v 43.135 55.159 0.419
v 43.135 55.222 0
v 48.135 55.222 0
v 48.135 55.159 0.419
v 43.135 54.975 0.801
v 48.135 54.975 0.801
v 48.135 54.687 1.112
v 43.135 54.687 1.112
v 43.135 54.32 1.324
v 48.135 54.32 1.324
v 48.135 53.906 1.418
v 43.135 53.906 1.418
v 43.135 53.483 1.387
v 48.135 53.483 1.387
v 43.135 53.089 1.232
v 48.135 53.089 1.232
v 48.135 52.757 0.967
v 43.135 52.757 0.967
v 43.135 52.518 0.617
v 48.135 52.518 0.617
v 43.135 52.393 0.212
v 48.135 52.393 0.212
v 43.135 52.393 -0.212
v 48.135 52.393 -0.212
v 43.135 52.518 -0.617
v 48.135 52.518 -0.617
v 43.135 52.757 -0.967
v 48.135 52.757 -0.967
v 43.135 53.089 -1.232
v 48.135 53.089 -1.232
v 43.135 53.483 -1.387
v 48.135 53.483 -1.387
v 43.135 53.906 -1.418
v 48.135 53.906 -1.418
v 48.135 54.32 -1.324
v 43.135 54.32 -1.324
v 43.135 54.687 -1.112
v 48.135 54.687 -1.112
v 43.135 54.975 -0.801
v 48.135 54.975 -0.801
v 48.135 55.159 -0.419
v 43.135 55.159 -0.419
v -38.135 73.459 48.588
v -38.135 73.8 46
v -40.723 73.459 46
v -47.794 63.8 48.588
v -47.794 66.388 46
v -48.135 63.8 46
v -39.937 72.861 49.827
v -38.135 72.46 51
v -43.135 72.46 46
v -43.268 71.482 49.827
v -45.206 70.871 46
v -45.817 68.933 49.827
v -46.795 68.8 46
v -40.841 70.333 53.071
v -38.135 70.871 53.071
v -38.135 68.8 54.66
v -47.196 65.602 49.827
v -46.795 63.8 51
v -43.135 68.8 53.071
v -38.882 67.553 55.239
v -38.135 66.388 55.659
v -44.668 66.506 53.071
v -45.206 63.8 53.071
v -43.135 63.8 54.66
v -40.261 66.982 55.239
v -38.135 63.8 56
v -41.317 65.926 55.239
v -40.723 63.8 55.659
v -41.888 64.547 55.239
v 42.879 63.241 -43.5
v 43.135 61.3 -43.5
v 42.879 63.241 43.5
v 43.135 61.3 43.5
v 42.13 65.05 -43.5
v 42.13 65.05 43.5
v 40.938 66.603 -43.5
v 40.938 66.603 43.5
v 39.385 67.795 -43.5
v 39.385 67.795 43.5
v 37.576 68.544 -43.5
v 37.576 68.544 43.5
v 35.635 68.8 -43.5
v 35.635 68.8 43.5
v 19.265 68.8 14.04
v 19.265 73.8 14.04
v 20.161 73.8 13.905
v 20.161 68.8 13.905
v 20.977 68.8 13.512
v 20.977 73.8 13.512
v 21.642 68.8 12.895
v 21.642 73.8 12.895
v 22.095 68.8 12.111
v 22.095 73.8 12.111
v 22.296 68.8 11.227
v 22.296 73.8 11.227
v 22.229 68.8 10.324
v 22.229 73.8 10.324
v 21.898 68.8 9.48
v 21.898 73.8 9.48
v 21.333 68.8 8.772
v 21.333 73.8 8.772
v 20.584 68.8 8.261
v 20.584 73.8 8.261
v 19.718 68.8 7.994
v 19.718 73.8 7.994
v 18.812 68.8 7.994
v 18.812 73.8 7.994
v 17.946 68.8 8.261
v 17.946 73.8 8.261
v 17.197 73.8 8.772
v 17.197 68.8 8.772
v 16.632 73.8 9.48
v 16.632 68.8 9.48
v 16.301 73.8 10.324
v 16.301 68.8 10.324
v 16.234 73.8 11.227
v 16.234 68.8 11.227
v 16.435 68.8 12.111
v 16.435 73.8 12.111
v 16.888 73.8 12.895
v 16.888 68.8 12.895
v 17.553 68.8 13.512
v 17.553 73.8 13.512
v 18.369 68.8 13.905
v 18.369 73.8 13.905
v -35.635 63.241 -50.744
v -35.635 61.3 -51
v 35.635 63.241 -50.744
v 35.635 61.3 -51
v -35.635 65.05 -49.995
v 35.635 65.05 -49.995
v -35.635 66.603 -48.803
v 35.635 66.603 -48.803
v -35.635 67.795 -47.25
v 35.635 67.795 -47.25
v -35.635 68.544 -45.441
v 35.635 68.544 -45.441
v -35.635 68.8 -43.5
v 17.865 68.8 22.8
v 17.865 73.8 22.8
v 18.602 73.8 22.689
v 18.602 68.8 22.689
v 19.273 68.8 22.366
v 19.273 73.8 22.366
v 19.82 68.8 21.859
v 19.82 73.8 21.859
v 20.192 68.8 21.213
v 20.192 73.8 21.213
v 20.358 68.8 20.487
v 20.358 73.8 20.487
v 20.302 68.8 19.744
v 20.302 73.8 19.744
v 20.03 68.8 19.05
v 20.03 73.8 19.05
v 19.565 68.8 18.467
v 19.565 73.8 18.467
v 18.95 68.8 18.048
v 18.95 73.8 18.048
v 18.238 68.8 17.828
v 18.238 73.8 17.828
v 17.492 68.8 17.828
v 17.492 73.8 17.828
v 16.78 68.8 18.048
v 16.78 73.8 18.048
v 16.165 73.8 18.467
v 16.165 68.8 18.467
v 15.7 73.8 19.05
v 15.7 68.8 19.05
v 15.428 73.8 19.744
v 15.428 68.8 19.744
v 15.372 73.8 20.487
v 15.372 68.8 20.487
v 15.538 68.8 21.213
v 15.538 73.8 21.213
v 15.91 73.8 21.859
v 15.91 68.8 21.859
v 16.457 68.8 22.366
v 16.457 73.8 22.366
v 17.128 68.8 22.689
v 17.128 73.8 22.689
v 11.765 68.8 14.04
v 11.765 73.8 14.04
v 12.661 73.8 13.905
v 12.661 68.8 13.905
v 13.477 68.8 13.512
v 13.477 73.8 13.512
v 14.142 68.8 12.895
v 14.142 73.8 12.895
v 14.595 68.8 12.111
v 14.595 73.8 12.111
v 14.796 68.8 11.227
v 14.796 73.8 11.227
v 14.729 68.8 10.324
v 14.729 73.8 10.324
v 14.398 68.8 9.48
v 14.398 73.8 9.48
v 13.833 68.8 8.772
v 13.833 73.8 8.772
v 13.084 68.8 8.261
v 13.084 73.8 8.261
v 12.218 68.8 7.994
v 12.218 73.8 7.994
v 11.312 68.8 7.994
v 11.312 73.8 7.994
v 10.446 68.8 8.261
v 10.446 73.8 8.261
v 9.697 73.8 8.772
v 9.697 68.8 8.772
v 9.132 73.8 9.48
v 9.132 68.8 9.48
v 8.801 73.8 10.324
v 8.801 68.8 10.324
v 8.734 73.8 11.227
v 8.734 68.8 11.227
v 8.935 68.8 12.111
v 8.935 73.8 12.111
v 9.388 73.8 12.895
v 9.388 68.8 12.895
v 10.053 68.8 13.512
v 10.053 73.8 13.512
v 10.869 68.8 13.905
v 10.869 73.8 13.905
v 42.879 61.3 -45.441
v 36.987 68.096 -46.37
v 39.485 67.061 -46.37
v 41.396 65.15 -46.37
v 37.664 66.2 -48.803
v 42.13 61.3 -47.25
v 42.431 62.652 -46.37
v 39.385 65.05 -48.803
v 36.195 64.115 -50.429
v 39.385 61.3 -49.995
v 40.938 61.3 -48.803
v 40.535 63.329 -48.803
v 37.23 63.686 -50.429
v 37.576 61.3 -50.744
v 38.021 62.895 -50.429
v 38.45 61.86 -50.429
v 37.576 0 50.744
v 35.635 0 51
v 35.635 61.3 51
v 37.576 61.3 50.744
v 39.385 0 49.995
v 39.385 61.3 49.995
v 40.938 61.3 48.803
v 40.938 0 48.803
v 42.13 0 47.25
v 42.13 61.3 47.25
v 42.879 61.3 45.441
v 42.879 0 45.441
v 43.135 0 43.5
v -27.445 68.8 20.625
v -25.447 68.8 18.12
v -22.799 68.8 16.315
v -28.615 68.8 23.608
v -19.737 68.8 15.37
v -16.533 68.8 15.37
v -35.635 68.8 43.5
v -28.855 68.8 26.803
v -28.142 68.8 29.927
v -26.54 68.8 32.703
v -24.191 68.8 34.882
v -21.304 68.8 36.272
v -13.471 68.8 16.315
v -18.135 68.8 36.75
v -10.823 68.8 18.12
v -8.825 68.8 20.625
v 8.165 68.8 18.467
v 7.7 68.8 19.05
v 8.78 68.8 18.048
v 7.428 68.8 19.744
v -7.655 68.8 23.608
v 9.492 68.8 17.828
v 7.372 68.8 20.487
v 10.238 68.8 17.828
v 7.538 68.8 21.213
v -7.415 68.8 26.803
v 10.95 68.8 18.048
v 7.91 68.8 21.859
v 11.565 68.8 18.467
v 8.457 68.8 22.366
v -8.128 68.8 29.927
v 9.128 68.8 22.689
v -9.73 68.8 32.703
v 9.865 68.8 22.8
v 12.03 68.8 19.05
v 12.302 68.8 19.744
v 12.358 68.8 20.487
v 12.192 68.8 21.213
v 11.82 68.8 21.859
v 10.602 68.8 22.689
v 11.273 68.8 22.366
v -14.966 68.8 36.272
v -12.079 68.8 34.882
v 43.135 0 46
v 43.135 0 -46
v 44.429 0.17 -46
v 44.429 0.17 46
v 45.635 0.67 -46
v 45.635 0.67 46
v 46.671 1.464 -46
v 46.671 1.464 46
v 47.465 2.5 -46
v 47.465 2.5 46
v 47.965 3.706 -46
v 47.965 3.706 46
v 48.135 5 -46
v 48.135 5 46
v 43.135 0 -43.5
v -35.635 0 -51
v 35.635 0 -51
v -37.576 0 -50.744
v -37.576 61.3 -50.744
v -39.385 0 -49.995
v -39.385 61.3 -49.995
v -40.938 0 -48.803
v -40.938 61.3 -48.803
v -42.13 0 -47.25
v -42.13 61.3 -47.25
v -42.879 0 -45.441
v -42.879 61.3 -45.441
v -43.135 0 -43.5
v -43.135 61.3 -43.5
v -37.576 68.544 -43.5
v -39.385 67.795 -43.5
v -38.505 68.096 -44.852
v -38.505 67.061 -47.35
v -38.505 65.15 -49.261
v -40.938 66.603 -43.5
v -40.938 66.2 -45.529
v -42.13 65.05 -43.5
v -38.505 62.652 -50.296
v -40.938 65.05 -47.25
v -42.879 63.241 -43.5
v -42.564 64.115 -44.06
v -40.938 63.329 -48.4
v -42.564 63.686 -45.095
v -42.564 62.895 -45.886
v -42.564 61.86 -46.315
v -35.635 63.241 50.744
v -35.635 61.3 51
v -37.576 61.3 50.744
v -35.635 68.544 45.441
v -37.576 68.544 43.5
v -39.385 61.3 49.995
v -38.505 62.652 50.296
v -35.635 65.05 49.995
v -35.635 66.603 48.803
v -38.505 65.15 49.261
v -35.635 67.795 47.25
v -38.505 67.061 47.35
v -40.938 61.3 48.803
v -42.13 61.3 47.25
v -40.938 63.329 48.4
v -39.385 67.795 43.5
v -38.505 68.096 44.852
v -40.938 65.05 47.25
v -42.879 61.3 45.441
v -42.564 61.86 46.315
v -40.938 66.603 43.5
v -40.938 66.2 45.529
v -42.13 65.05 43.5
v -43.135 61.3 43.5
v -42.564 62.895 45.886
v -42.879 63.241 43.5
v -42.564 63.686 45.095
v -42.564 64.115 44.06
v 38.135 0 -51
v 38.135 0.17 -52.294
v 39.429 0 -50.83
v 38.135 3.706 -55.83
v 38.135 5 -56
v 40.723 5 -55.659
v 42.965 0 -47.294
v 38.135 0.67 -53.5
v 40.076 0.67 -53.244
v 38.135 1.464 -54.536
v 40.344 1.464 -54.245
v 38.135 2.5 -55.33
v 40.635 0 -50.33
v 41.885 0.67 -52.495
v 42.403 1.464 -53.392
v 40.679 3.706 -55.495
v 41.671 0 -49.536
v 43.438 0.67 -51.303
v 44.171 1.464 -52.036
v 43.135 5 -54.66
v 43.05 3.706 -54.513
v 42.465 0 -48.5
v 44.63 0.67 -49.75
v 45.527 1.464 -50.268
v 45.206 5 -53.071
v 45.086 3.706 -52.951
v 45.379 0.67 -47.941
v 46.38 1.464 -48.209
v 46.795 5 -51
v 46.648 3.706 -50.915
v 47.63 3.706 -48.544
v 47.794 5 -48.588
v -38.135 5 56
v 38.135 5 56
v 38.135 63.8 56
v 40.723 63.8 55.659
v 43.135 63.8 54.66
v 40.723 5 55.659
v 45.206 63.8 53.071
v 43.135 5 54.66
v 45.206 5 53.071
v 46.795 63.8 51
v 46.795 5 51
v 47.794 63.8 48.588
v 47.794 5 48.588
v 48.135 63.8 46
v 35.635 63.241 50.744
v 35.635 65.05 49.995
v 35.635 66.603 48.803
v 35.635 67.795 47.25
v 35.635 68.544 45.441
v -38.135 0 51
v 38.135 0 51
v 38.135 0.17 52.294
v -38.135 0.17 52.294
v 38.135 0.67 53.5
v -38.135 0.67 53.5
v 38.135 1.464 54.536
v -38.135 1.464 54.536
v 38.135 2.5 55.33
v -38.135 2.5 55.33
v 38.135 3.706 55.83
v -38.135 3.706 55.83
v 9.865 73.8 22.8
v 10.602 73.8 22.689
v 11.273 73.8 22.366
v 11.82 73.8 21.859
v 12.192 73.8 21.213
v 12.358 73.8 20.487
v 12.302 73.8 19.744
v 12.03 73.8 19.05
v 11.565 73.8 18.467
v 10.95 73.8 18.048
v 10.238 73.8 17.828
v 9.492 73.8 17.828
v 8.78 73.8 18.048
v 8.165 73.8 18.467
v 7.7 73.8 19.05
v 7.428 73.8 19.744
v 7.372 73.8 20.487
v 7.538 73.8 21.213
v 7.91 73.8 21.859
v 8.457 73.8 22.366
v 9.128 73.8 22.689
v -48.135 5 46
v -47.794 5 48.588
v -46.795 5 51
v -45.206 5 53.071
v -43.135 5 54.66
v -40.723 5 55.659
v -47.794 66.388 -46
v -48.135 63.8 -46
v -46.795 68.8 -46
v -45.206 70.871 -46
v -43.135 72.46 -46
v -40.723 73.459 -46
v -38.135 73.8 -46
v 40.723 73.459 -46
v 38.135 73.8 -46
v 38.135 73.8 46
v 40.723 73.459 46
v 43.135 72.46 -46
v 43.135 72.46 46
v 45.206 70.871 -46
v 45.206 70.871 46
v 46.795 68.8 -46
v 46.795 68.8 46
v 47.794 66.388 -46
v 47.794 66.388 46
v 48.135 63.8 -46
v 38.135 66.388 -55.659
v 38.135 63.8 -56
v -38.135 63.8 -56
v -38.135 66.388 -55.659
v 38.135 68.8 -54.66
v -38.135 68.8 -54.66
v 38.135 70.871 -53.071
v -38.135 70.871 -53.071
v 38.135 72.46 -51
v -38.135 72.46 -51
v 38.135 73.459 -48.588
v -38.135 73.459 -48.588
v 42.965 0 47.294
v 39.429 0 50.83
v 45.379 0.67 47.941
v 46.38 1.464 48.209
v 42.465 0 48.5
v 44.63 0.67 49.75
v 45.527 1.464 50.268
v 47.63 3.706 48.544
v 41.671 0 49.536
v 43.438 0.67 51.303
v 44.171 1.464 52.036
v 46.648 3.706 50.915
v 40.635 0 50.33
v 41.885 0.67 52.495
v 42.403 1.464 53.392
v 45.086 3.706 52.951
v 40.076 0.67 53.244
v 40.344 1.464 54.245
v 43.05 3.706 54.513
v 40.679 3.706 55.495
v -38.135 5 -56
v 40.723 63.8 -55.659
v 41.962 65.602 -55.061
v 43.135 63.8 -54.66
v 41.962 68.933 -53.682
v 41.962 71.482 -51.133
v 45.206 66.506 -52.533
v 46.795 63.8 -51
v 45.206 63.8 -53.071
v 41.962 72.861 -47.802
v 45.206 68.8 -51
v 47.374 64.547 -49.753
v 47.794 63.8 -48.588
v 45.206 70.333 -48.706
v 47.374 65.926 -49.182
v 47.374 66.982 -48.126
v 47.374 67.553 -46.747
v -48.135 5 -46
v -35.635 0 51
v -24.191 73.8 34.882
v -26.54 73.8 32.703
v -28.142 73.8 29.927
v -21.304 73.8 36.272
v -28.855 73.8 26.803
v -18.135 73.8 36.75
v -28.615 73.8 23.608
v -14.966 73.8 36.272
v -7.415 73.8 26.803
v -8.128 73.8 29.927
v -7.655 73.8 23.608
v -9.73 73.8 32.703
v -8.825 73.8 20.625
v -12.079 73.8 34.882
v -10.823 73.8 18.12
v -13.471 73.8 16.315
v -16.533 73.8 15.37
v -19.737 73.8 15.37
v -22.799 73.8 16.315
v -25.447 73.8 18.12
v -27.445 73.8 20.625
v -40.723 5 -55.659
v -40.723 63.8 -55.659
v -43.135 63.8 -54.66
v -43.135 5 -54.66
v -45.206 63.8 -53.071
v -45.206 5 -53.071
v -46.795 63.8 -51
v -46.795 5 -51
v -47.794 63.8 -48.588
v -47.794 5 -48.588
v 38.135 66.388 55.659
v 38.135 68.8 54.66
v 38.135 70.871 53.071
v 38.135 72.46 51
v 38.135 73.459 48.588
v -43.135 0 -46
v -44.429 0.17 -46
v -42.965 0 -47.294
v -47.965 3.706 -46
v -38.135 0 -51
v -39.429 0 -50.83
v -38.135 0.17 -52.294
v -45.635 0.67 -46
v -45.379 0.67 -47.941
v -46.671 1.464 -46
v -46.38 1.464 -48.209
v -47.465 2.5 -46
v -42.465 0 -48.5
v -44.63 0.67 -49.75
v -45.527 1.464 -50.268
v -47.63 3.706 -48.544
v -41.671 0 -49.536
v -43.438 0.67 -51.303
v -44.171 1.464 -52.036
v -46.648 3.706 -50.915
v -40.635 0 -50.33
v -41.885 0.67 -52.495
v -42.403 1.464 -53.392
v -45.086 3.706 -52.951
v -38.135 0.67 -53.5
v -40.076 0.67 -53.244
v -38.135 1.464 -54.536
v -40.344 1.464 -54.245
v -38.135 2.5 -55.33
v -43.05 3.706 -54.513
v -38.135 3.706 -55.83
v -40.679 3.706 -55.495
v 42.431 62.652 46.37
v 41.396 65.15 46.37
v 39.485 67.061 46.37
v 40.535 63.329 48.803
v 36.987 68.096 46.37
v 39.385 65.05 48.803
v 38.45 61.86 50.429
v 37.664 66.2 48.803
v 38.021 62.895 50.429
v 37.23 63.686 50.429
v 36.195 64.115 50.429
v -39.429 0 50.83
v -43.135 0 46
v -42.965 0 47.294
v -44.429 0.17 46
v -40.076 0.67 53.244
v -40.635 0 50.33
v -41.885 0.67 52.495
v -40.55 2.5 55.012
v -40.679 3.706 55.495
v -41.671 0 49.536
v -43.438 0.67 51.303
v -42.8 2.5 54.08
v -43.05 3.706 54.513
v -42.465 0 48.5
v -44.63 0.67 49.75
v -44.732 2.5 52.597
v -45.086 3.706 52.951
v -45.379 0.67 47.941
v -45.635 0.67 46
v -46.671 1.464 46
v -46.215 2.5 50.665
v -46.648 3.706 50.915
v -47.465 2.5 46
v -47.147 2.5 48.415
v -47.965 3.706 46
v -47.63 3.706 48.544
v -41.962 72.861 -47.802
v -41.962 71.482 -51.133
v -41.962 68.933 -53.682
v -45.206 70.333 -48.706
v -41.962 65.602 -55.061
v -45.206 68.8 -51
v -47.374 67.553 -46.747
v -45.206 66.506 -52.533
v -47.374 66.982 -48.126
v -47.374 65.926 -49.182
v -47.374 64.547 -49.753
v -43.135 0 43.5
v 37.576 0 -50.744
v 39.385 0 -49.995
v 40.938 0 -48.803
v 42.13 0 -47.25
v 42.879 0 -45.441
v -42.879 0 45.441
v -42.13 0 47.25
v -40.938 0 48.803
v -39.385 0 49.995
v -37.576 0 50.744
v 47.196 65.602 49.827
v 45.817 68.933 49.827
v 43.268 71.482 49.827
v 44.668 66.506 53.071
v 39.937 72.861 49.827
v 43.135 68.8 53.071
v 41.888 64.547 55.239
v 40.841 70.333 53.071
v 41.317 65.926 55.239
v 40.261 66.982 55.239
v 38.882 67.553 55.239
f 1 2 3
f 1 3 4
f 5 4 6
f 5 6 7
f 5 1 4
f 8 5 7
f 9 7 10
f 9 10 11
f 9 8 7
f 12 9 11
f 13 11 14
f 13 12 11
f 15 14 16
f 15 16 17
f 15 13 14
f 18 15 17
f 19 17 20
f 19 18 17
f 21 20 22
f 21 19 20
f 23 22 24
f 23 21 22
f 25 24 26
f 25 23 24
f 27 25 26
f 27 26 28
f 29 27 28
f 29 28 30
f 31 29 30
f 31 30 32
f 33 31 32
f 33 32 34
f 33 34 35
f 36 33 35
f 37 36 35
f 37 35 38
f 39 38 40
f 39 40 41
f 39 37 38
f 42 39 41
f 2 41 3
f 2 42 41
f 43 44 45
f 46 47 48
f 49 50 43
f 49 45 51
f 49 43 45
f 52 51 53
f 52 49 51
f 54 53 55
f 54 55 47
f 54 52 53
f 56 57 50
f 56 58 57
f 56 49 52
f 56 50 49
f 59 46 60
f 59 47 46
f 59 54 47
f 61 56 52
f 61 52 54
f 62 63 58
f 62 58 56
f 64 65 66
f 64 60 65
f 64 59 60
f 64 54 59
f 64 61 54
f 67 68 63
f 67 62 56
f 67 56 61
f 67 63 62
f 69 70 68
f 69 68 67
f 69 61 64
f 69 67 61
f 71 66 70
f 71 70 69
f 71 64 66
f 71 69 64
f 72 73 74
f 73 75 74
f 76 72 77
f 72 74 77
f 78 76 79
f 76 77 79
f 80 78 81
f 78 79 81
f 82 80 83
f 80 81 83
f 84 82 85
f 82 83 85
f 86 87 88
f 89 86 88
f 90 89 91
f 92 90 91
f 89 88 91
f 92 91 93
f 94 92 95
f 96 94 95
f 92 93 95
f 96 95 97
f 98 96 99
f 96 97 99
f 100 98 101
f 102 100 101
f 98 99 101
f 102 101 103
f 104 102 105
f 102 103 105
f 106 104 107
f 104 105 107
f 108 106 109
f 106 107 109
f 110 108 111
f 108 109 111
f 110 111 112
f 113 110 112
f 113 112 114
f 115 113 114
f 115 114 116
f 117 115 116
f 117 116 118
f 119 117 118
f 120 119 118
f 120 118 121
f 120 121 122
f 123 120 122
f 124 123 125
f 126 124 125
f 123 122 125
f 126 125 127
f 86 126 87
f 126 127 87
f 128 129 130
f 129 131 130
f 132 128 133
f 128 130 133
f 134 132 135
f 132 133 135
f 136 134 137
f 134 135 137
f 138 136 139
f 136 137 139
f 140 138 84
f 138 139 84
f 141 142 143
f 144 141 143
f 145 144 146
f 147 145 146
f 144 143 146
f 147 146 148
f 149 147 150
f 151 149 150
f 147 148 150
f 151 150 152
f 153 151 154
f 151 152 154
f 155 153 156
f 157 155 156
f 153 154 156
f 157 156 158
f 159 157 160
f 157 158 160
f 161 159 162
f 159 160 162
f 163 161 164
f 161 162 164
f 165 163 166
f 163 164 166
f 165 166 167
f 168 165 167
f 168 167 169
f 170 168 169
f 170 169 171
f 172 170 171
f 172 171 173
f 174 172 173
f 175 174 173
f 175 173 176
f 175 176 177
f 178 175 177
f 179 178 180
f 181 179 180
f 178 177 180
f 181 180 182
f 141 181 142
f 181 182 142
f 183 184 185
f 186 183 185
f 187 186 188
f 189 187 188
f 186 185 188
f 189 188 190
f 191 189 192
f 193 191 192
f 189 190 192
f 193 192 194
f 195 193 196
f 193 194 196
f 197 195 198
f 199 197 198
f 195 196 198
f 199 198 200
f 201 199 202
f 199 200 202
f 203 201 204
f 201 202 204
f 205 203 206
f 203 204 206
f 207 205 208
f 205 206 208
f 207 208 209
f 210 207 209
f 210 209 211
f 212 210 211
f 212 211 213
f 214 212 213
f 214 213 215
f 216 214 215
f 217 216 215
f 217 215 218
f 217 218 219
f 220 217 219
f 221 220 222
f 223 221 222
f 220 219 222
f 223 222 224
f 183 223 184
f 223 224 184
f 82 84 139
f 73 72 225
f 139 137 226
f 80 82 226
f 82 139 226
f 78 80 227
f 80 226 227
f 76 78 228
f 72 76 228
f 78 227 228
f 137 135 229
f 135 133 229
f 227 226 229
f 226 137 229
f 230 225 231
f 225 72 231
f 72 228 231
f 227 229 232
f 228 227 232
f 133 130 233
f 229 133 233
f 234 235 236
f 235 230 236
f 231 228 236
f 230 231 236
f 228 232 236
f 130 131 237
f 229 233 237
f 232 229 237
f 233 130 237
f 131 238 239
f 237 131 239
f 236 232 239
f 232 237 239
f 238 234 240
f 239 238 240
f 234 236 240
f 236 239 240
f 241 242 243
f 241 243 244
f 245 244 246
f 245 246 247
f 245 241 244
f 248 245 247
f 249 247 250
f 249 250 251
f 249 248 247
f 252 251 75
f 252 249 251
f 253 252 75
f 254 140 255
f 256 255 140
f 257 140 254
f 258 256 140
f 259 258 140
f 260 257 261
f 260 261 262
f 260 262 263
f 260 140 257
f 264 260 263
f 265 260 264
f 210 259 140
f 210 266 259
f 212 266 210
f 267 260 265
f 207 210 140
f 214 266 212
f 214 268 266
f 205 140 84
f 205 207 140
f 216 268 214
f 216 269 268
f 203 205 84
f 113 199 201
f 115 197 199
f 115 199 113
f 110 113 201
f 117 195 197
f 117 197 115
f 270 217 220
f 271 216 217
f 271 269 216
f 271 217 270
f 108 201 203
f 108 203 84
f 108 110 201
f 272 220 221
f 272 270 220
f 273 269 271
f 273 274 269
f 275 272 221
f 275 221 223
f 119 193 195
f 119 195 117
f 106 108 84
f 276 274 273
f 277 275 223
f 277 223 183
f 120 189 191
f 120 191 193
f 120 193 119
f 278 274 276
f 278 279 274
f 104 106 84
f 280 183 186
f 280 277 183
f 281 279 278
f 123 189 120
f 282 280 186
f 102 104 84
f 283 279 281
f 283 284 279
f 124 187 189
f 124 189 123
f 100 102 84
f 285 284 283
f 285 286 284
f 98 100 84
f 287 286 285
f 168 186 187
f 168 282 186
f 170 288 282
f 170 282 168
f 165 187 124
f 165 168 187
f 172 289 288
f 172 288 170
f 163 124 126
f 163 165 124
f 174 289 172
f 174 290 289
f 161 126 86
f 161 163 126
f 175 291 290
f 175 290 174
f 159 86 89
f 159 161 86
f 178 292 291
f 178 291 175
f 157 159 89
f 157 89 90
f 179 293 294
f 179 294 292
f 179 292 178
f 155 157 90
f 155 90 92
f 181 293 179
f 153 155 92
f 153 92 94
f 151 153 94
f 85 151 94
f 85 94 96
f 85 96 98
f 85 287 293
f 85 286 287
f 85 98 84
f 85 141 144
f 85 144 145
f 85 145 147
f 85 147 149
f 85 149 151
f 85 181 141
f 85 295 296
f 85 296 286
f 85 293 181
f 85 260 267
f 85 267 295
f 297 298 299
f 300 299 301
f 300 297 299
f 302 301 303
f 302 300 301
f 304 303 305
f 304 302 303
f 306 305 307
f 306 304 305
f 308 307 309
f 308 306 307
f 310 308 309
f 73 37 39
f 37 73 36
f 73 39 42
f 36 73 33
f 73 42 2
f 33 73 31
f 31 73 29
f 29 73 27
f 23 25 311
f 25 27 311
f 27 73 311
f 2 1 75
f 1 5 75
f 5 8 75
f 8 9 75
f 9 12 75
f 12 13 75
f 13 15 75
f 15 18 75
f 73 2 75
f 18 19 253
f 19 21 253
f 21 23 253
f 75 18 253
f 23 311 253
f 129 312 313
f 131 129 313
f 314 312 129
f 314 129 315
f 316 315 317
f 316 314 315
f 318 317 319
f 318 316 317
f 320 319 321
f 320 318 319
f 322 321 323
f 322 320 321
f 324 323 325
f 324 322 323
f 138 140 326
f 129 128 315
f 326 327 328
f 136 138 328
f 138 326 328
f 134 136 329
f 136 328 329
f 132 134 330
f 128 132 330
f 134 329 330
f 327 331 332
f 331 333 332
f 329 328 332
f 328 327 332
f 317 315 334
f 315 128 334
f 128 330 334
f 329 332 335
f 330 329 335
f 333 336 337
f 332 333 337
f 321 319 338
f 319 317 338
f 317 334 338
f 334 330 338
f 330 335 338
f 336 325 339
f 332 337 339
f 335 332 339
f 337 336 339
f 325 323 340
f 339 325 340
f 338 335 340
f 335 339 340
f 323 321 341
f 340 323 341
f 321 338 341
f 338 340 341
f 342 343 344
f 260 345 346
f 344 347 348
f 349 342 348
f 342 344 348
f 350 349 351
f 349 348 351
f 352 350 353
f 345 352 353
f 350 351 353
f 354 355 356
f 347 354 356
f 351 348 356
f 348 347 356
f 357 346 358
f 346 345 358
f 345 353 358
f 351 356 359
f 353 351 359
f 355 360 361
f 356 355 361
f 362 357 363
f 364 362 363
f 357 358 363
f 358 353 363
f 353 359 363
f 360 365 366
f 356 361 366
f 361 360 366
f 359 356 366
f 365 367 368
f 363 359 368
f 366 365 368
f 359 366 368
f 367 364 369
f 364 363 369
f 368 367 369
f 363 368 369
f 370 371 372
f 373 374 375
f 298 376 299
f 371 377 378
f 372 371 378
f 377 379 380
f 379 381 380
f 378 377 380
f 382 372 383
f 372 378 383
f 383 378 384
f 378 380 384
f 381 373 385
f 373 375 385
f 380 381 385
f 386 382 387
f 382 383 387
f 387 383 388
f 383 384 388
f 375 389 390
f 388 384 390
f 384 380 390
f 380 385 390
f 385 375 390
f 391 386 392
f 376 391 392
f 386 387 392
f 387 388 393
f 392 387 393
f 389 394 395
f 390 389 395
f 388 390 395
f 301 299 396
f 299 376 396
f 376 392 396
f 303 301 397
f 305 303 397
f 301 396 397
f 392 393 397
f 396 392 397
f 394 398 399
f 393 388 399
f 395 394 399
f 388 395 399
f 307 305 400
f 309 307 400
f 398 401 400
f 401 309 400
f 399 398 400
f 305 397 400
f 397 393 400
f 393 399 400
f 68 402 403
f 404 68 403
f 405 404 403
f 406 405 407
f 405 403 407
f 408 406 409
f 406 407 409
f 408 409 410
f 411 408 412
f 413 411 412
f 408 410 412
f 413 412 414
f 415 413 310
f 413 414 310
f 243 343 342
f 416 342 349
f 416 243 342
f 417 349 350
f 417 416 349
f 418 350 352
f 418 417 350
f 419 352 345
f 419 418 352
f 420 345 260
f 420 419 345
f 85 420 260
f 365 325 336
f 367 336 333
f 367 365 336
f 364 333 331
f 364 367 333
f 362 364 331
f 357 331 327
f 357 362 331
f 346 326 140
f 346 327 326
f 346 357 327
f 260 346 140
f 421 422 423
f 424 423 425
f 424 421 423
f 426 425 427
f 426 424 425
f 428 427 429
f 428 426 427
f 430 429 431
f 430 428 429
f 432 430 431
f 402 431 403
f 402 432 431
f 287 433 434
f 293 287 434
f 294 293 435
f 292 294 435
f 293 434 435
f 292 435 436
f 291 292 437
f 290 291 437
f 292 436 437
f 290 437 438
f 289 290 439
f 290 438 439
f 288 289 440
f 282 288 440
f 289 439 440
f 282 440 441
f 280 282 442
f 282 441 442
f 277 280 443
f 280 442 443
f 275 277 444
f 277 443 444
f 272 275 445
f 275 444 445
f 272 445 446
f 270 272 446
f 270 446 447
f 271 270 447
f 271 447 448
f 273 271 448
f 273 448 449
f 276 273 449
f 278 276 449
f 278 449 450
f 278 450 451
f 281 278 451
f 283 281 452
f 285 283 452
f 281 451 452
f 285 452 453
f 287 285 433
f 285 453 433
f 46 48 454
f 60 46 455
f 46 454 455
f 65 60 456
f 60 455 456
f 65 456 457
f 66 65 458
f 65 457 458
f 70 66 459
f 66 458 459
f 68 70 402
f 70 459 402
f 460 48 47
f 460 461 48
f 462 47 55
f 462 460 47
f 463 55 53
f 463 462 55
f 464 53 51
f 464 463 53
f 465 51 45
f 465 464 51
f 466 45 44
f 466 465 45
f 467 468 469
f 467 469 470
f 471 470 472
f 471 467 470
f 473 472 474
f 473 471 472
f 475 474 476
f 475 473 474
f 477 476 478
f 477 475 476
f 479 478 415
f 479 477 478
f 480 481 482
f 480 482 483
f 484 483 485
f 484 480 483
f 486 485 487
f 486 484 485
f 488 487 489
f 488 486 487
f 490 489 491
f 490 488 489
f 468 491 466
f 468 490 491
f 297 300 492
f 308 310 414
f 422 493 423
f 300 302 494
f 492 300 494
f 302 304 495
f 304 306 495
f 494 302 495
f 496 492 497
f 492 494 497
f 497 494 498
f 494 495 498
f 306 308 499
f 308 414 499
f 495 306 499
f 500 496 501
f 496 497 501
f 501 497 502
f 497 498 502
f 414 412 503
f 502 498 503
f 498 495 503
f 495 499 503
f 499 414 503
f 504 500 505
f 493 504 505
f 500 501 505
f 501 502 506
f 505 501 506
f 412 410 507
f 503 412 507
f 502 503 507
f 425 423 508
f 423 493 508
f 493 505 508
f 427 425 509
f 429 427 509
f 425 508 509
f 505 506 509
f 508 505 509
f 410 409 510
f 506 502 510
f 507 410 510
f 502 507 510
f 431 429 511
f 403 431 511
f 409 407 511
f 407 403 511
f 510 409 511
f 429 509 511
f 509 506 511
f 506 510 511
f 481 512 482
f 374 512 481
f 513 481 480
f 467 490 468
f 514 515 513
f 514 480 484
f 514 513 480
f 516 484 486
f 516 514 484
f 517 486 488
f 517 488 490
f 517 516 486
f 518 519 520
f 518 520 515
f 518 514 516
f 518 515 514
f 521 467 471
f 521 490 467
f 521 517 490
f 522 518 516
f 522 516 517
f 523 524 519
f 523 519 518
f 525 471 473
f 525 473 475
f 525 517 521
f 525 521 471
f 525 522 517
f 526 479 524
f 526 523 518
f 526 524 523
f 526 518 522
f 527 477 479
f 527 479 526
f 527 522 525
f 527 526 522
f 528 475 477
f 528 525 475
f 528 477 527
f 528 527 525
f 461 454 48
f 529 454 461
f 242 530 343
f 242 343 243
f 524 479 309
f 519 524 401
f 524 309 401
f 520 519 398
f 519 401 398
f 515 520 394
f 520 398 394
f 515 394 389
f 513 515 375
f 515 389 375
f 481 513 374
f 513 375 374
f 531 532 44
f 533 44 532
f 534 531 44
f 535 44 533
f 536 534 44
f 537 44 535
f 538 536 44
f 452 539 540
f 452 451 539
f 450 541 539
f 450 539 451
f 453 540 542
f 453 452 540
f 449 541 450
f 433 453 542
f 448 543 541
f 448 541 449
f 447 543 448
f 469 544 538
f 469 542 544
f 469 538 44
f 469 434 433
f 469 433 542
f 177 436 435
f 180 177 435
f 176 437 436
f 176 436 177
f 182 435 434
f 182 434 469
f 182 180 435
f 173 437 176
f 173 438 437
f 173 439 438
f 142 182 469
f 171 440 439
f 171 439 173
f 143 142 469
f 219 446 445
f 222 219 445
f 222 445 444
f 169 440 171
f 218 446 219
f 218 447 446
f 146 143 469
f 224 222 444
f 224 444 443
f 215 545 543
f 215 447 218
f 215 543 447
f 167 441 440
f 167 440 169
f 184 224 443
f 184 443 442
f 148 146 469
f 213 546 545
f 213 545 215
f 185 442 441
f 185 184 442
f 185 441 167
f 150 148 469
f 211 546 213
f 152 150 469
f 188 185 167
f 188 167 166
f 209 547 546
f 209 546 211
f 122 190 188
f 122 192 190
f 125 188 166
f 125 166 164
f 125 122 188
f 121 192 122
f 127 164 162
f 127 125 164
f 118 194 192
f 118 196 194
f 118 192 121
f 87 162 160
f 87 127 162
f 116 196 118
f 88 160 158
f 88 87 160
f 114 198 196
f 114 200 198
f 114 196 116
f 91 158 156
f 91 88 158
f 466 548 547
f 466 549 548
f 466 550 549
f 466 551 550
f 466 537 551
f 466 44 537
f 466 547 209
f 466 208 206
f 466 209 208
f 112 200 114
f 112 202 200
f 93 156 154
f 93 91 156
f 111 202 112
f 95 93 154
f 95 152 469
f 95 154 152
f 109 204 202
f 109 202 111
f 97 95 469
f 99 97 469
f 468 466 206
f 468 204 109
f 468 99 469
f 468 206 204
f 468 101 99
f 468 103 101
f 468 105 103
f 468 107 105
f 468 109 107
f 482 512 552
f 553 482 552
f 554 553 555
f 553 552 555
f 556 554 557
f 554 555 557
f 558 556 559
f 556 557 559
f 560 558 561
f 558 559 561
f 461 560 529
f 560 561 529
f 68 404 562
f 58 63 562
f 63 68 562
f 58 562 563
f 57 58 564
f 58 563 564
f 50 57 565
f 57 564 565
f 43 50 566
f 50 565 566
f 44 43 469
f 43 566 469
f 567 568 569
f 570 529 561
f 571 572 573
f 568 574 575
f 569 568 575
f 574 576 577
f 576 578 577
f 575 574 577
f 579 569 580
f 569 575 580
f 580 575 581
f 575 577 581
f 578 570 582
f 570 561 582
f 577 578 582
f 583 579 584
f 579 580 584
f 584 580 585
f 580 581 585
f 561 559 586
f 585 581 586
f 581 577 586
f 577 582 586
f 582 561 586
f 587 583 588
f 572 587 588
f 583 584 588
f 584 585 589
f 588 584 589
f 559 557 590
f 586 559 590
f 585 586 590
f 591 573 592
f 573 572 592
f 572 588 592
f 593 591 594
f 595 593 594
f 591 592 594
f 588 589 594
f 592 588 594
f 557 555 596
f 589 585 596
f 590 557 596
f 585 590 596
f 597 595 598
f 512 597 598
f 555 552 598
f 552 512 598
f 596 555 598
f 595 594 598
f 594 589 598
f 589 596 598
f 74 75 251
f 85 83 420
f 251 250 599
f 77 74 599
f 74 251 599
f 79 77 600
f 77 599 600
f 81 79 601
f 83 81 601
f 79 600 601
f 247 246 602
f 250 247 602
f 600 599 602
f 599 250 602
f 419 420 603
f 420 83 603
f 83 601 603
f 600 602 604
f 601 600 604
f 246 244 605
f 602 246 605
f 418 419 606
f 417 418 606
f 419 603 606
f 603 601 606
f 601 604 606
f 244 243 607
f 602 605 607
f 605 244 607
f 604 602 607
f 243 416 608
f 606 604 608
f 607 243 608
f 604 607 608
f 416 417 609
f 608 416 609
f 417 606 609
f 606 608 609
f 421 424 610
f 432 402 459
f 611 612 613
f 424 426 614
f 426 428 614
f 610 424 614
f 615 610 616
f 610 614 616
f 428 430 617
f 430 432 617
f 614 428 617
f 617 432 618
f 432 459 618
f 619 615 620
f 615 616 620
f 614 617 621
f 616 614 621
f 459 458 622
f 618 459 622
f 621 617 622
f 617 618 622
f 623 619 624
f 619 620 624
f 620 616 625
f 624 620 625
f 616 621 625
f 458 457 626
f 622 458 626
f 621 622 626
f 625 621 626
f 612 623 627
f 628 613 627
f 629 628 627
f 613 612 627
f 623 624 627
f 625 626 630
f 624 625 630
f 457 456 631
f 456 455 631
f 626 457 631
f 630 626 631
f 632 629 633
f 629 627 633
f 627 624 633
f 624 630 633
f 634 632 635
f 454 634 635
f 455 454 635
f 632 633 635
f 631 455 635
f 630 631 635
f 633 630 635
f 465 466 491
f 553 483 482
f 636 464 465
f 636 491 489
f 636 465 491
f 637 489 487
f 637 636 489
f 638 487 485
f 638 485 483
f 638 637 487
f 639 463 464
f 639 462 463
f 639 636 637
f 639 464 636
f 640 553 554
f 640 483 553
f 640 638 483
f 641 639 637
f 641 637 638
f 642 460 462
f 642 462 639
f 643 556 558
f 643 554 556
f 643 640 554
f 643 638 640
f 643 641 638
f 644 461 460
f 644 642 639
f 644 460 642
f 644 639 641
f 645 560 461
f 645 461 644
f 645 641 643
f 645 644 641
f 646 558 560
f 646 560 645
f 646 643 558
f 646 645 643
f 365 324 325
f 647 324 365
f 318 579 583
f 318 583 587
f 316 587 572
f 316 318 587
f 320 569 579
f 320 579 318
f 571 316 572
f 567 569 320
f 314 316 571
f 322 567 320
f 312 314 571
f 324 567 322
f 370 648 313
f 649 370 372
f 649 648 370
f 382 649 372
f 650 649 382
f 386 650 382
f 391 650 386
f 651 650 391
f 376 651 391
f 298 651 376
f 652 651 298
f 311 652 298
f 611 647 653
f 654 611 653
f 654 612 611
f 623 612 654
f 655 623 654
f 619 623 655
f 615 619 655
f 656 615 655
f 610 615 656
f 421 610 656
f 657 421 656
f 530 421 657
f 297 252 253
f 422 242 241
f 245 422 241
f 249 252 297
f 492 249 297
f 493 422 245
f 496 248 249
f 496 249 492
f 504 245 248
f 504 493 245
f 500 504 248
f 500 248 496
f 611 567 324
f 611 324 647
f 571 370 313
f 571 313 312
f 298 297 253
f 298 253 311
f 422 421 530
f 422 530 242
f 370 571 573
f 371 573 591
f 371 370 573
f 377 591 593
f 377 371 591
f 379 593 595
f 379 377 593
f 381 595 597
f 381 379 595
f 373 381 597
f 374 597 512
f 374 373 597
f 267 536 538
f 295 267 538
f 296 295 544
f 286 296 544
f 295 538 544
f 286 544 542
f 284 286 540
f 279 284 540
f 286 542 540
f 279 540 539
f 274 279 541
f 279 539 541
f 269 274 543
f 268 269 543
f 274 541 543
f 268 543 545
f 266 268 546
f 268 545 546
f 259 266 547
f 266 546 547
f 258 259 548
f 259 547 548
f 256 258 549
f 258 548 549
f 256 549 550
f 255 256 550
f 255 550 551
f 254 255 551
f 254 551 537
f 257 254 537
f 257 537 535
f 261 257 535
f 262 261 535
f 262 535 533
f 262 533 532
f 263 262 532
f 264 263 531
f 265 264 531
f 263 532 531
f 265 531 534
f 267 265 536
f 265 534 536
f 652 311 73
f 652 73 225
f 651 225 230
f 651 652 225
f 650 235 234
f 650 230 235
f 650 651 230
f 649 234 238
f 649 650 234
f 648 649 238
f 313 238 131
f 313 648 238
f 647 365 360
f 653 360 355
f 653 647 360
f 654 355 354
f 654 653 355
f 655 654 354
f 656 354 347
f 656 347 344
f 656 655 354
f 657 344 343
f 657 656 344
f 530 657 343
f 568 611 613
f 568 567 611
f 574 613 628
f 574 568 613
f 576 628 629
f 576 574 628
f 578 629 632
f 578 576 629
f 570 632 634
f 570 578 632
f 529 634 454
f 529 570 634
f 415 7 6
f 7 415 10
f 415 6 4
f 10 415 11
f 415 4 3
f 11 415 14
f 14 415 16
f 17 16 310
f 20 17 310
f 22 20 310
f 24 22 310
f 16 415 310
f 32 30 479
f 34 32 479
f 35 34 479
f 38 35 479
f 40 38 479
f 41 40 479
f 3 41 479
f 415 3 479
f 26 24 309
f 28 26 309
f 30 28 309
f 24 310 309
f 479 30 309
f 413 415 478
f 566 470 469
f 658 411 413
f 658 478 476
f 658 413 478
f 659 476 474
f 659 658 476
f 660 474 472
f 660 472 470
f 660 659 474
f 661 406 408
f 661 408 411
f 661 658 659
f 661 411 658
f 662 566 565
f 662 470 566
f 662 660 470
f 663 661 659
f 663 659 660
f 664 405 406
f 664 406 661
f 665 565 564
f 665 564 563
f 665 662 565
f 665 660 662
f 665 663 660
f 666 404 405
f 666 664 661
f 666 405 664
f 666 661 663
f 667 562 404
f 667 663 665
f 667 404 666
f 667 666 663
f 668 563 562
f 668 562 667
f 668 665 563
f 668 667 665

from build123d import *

# Parameters (mm, degrees)
SKETCH1_W           = 96.27
SKETCH1_H           = 112
BOSS_EXTRUDE1_DEPTH = 73.8
SKETCH2_W           = 86.27
SKETCH2_H           = 102
CUT_EXTRUDE1_DEPTH  = 68.8
FILLET1_R           = 10
FILLET2_R           = 10
FILLET3_R           = 7.5
FILLET4_R           = 7.5
FILLET6_R           = 5
SKETCH3_R           = 3.04
CUT_EXTRUDE2_DEPTH  = 5
SKETCH4_R           = 10.75
CUT_EXTRUDE3_DEPTH  = 5
SKETCH5_R           = 2.5
CUT_EXTRUDE4_DEPTH  = 5
HOLE1_START         = 43.135
HOLE1_OUTLINE_R     = 1.4224
HOLE1_DEPTH         = 5


# Read off the part's stored shape, not the designer's step: Hole1
# Some blends are built 0.0001 mm under size
with BuildPart() as part:
    # Sketch1 → Boss-Extrude1 (new body)
    with BuildSketch(Plane(origin=(0, 0, 0), x_dir=(1, 0, 0), z_dir=(0, 1, 0))):
        Rectangle(SKETCH1_W, SKETCH1_H)
    extrude(amount=BOSS_EXTRUDE1_DEPTH)

    # Sketch2 → Cut-Extrude1 (cut)
    with BuildSketch(Plane.XZ):
        Rectangle(SKETCH2_W, SKETCH2_H)
    extrude(amount=-CUT_EXTRUDE1_DEPTH, mode=Mode.SUBTRACT)

    # Fillet1
    fillet1_edges = [part.edges().sort_by_distance(p)[0] for p in [
        (-48.135, 73.8, 0),
        (0, 73.8, 56),
        (48.135, 73.8, 0),
        (0, 73.8, -56),
    ]]
    fillet(fillet1_edges, radius=FILLET1_R)

    # Fillet2
    # the kernel refuses this fillet: 10 mm, written as the material it takes off along each edge
    with BuildSketch(Plane(origin=(38.135, 63.8, 46), x_dir=(1, 0, 0), z_dir=(0, 0, 1))) as fillet2_piece_1_section:
        Polygon((0, 0), (FILLET2_R, 0), (FILLET2_R, FILLET2_R), (0, FILLET2_R), align=None)
    fillet2_piece_1 = extrude(amount=FILLET2_R, mode=Mode.PRIVATE)
    fillet2_piece_1 = fillet2_piece_1 - Plane(origin=(38.135, 63.8, 46), x_dir=(-0.7071067811865475, -0.7071067811865475, 0), z_dir=(0, 0, 1)) * Sphere(FILLET2_R, mode=Mode.PRIVATE)
    add(fillet2_piece_1, mode=Mode.SUBTRACT)
    with BuildSketch(Plane(origin=(-38.135, 63.8, 46), x_dir=(-1, 0, 0), z_dir=(0, 0, 1))) as fillet2_piece_2_section:
        Polygon((0, 0), (FILLET2_R, 0), (FILLET2_R, -FILLET2_R), (0, -FILLET2_R), align=None)
    fillet2_piece_2 = extrude(amount=FILLET2_R, mode=Mode.PRIVATE)
    fillet2_piece_2 = fillet2_piece_2 - Plane(origin=(-38.135, 63.8, 46), x_dir=(0.7071067811865475, -0.7071067811865475, 0), z_dir=(0, 0, 1)) * Sphere(FILLET2_R, mode=Mode.PRIVATE)
    add(fillet2_piece_2, mode=Mode.SUBTRACT)
    with BuildSketch(Plane(origin=(38.135, 63.8, -46), x_dir=(0, 0, -1), z_dir=(1, 0, 0))) as fillet2_piece_3_section:
        Polygon((0, 0), (FILLET2_R, 0), (FILLET2_R, FILLET2_R), (0, FILLET2_R), align=None)
    fillet2_piece_3 = extrude(amount=FILLET2_R, mode=Mode.PRIVATE)
    fillet2_piece_3 = fillet2_piece_3 - Plane(origin=(38.135, 63.8, -46), x_dir=(0, -0.7071067811865475, 0.7071067811865475), z_dir=(1, 0, 0)) * Sphere(FILLET2_R, mode=Mode.PRIVATE)
    add(fillet2_piece_3, mode=Mode.SUBTRACT)
    with BuildSketch(Plane(origin=(-38.135, 63.8, -46), x_dir=(0, 0, -1), z_dir=(-1, 0, 0))) as fillet2_piece_4_section:
        Polygon((0, 0), (FILLET2_R, 0), (FILLET2_R, -FILLET2_R), (0, -FILLET2_R), align=None)
    fillet2_piece_4 = extrude(amount=FILLET2_R, mode=Mode.PRIVATE)
    fillet2_piece_4 = fillet2_piece_4 - Plane(origin=(-38.135, 63.8, -46), x_dir=(0, -0.7071067811865475, 0.7071067811865475), z_dir=(-1, 0, 0)) * Sphere(FILLET2_R, mode=Mode.PRIVATE)
    add(fillet2_piece_4, mode=Mode.SUBTRACT)
    with BuildSketch(Plane(origin=(-48.135, -25, -56), x_dir=(0, 0, 1), z_dir=(0, 1, 0)), Plane(origin=(-48.135, -25, 56), x_dir=(1, 0, 0), z_dir=(0, 1, 0))) as fillet2_piece_5:
        with BuildLine():
            CenterArc((FILLET2_R, FILLET2_R), FILLET2_R, 180, 90)
            Line((0, FILLET2_R), (0, 0))
            Line((0, 0), (FILLET2_R, 0))
        make_face()
    extrude(amount=88.8, mode=Mode.SUBTRACT)
    with BuildSketch(Plane(origin=(48.135, -25, -56), x_dir=(0, 0, 1), z_dir=(0, 1, 0)), Plane(origin=(48.135, -25, 56), x_dir=(-1, 0, 0), z_dir=(0, 1, 0))) as fillet2_piece_6:
        with BuildLine():
            CenterArc((FILLET2_R, -FILLET2_R), FILLET2_R, 90, 90)
            Line((0, -FILLET2_R), (0, 0))
            Line((0, 0), (FILLET2_R, 0))
        make_face()
    extrude(amount=88.8, mode=Mode.SUBTRACT)

    # Fillet3
    fillet3_edges = [part.edges().sort_by_distance(p)[0] for p in [
        (43.135, 68.8, 0),
        (0, 68.8, -51),
        (-43.135, 68.8, 0),
        (0, 68.8, 51),
    ]]
    fillet(fillet3_edges, radius=FILLET3_R)

    # Fillet4
    # the kernel refuses this fillet: 7.5 mm, written as the material it adds along each edge
    with BuildSketch(Plane(origin=(-35.635, 61.3, -43.5), x_dir=(0, 0, -1), z_dir=(-1, 0, 0))) as fillet4_piece_1_section:
        Polygon((0, 0), (FILLET4_R, 0), (FILLET4_R, -FILLET4_R), (0, -FILLET4_R), align=None)
    fillet4_piece_1 = extrude(amount=FILLET4_R, mode=Mode.PRIVATE)
    fillet4_piece_1 = fillet4_piece_1 - Plane(origin=(-35.635, 61.3, -43.5), x_dir=(0, -0.7071067811865475, 0.7071067811865475), z_dir=(-1, 0, 0)) * Sphere(FILLET4_R, mode=Mode.PRIVATE)
    add(fillet4_piece_1)
    with BuildSketch(Plane(origin=(-35.635, 61.3, 43.5), x_dir=(0, 0, 1), z_dir=(-1, 0, 0))) as fillet4_piece_2_section:
        Polygon((0, 0), (FILLET4_R, 0), (FILLET4_R, FILLET4_R), (0, FILLET4_R), align=None)
    fillet4_piece_2 = extrude(amount=FILLET4_R, mode=Mode.PRIVATE)
    fillet4_piece_2 = fillet4_piece_2 - Plane(origin=(-35.635, 61.3, 43.5), x_dir=(0, -0.7071067811865475, -0.7071067811865475), z_dir=(-1, 0, 0)) * Sphere(FILLET4_R, mode=Mode.PRIVATE)
    add(fillet4_piece_2)
    with BuildSketch(Plane(origin=(35.635, 61.3, -43.5), x_dir=(1, 0, 0), z_dir=(0, 0, -1))) as fillet4_piece_3_section:
        Polygon((0, 0), (FILLET4_R, 0), (FILLET4_R, -FILLET4_R), (0, -FILLET4_R), align=None)
    fillet4_piece_3 = extrude(amount=FILLET4_R, mode=Mode.PRIVATE)
    fillet4_piece_3 = fillet4_piece_3 - Plane(origin=(35.635, 61.3, -43.5), x_dir=(-0.7071067811865475, -0.7071067811865475, 0), z_dir=(0, 0, -1)) * Sphere(FILLET4_R, mode=Mode.PRIVATE)
    add(fillet4_piece_3)
    with BuildSketch(Plane(origin=(35.635, 61.3, 43.5), x_dir=(1, 0, 0), z_dir=(0, 0, 1))) as fillet4_piece_4_section:
        Polygon((0, 0), (FILLET4_R, 0), (FILLET4_R, FILLET4_R), (0, FILLET4_R), align=None)
    fillet4_piece_4 = extrude(amount=FILLET4_R, mode=Mode.PRIVATE)
    fillet4_piece_4 = fillet4_piece_4 - Plane(origin=(35.635, 61.3, 43.5), x_dir=(-0.7071067811865475, -0.7071067811865475, 0), z_dir=(0, 0, 1)) * Sphere(FILLET4_R, mode=Mode.PRIVATE)
    add(fillet4_piece_4)
    with BuildSketch(Plane(origin=(43.135, 0, 51), x_dir=(-1, 0, 0), z_dir=(0, 1, 0)), Plane(origin=(-43.135, 0, 51), x_dir=(0, 0, -1), z_dir=(0, 1, 0))) as fillet4_piece_5:
        with BuildLine():
            CenterArc((FILLET4_R, -FILLET4_R), FILLET4_R, 90, 90)
            Line((0, -FILLET4_R), (0, 0))
            Line((0, 0), (FILLET4_R, 0))
        make_face()
    extrude(amount=61.3)
    with BuildSketch(Plane(origin=(43.135, 0, -51), x_dir=(-1, 0, 0), z_dir=(0, 1, 0)), Plane(origin=(-43.135, 0, -51), x_dir=(0, 0, 1), z_dir=(0, 1, 0))) as fillet4_piece_6:
        with BuildLine():
            CenterArc((FILLET4_R, FILLET4_R), FILLET4_R, 180, 90)
            Line((0, FILLET4_R), (0, 0))
            Line((0, 0), (FILLET4_R, 0))
        make_face()
    extrude(amount=61.3)

    # Fillet6
    fillet6_edges = [part.edges().sort_by_distance(p)[0] for p in [
        (-48.135, 0, 0),
        (48.135, 0, 0),
        (0, 0, 56),
        (0, 0, -56),
        (-45.206067812, 0, 53.071067812),
        (45.206067812, 0, 53.071067812),
        (45.206067812, 0, -53.071067812),
        (-45.206067812, 0, -53.071067812),
    ]]
    fillet(fillet6_edges, radius=FILLET6_R - 0.0001)  # a hair under: the kernel refuses the full size

    # Sketch3 → Cut-Extrude2 (cut)
    with BuildSketch(Plane(origin=(0, 73.8, 0), x_dir=(1, 0, 0), z_dir=(0, 1, 0))):
        with Locations(Location((19.265, -11, 0), (0, 0, 270))):
            Circle(SKETCH3_R)
        with Locations(Location((11.765, -11, 0), (0, 0, 270))):
            Circle(SKETCH3_R)
    extrude(amount=-CUT_EXTRUDE2_DEPTH, mode=Mode.SUBTRACT)

    # Sketch4 → Cut-Extrude3 (cut)
    with BuildSketch(Plane(origin=(0, 73.8, 0), x_dir=(1, 0, 0), z_dir=(0, 1, 0))):
        with Locations(Location((-18.135, -26, 0), (0, 0, 270))):
            Circle(SKETCH4_R)
    extrude(amount=-CUT_EXTRUDE3_DEPTH, mode=Mode.SUBTRACT)

    # Sketch5 → Cut-Extrude4 (cut)
    with BuildSketch(Plane(origin=(0, 73.8, 0), x_dir=(1, 0, 0), z_dir=(0, 1, 0))):
        with Locations(Location((9.865, -20.3, 0), (0, 0, 270))):
            Circle(SKETCH5_R)
        with Locations(Location((17.865, -20.3, 0), (0, 0, 270))):
            Circle(SKETCH5_R)
    extrude(amount=-CUT_EXTRUDE4_DEPTH, mode=Mode.SUBTRACT)

    # Hole1 outline → Hole1 (cut)
    with BuildSketch(Plane.YZ.offset(HOLE1_START)):
        with Locations((53.8, 0)):
            Circle(HOLE1_OUTLINE_R)
    extrude(amount=HOLE1_DEPTH, mode=Mode.SUBTRACT)


solid = part.part
